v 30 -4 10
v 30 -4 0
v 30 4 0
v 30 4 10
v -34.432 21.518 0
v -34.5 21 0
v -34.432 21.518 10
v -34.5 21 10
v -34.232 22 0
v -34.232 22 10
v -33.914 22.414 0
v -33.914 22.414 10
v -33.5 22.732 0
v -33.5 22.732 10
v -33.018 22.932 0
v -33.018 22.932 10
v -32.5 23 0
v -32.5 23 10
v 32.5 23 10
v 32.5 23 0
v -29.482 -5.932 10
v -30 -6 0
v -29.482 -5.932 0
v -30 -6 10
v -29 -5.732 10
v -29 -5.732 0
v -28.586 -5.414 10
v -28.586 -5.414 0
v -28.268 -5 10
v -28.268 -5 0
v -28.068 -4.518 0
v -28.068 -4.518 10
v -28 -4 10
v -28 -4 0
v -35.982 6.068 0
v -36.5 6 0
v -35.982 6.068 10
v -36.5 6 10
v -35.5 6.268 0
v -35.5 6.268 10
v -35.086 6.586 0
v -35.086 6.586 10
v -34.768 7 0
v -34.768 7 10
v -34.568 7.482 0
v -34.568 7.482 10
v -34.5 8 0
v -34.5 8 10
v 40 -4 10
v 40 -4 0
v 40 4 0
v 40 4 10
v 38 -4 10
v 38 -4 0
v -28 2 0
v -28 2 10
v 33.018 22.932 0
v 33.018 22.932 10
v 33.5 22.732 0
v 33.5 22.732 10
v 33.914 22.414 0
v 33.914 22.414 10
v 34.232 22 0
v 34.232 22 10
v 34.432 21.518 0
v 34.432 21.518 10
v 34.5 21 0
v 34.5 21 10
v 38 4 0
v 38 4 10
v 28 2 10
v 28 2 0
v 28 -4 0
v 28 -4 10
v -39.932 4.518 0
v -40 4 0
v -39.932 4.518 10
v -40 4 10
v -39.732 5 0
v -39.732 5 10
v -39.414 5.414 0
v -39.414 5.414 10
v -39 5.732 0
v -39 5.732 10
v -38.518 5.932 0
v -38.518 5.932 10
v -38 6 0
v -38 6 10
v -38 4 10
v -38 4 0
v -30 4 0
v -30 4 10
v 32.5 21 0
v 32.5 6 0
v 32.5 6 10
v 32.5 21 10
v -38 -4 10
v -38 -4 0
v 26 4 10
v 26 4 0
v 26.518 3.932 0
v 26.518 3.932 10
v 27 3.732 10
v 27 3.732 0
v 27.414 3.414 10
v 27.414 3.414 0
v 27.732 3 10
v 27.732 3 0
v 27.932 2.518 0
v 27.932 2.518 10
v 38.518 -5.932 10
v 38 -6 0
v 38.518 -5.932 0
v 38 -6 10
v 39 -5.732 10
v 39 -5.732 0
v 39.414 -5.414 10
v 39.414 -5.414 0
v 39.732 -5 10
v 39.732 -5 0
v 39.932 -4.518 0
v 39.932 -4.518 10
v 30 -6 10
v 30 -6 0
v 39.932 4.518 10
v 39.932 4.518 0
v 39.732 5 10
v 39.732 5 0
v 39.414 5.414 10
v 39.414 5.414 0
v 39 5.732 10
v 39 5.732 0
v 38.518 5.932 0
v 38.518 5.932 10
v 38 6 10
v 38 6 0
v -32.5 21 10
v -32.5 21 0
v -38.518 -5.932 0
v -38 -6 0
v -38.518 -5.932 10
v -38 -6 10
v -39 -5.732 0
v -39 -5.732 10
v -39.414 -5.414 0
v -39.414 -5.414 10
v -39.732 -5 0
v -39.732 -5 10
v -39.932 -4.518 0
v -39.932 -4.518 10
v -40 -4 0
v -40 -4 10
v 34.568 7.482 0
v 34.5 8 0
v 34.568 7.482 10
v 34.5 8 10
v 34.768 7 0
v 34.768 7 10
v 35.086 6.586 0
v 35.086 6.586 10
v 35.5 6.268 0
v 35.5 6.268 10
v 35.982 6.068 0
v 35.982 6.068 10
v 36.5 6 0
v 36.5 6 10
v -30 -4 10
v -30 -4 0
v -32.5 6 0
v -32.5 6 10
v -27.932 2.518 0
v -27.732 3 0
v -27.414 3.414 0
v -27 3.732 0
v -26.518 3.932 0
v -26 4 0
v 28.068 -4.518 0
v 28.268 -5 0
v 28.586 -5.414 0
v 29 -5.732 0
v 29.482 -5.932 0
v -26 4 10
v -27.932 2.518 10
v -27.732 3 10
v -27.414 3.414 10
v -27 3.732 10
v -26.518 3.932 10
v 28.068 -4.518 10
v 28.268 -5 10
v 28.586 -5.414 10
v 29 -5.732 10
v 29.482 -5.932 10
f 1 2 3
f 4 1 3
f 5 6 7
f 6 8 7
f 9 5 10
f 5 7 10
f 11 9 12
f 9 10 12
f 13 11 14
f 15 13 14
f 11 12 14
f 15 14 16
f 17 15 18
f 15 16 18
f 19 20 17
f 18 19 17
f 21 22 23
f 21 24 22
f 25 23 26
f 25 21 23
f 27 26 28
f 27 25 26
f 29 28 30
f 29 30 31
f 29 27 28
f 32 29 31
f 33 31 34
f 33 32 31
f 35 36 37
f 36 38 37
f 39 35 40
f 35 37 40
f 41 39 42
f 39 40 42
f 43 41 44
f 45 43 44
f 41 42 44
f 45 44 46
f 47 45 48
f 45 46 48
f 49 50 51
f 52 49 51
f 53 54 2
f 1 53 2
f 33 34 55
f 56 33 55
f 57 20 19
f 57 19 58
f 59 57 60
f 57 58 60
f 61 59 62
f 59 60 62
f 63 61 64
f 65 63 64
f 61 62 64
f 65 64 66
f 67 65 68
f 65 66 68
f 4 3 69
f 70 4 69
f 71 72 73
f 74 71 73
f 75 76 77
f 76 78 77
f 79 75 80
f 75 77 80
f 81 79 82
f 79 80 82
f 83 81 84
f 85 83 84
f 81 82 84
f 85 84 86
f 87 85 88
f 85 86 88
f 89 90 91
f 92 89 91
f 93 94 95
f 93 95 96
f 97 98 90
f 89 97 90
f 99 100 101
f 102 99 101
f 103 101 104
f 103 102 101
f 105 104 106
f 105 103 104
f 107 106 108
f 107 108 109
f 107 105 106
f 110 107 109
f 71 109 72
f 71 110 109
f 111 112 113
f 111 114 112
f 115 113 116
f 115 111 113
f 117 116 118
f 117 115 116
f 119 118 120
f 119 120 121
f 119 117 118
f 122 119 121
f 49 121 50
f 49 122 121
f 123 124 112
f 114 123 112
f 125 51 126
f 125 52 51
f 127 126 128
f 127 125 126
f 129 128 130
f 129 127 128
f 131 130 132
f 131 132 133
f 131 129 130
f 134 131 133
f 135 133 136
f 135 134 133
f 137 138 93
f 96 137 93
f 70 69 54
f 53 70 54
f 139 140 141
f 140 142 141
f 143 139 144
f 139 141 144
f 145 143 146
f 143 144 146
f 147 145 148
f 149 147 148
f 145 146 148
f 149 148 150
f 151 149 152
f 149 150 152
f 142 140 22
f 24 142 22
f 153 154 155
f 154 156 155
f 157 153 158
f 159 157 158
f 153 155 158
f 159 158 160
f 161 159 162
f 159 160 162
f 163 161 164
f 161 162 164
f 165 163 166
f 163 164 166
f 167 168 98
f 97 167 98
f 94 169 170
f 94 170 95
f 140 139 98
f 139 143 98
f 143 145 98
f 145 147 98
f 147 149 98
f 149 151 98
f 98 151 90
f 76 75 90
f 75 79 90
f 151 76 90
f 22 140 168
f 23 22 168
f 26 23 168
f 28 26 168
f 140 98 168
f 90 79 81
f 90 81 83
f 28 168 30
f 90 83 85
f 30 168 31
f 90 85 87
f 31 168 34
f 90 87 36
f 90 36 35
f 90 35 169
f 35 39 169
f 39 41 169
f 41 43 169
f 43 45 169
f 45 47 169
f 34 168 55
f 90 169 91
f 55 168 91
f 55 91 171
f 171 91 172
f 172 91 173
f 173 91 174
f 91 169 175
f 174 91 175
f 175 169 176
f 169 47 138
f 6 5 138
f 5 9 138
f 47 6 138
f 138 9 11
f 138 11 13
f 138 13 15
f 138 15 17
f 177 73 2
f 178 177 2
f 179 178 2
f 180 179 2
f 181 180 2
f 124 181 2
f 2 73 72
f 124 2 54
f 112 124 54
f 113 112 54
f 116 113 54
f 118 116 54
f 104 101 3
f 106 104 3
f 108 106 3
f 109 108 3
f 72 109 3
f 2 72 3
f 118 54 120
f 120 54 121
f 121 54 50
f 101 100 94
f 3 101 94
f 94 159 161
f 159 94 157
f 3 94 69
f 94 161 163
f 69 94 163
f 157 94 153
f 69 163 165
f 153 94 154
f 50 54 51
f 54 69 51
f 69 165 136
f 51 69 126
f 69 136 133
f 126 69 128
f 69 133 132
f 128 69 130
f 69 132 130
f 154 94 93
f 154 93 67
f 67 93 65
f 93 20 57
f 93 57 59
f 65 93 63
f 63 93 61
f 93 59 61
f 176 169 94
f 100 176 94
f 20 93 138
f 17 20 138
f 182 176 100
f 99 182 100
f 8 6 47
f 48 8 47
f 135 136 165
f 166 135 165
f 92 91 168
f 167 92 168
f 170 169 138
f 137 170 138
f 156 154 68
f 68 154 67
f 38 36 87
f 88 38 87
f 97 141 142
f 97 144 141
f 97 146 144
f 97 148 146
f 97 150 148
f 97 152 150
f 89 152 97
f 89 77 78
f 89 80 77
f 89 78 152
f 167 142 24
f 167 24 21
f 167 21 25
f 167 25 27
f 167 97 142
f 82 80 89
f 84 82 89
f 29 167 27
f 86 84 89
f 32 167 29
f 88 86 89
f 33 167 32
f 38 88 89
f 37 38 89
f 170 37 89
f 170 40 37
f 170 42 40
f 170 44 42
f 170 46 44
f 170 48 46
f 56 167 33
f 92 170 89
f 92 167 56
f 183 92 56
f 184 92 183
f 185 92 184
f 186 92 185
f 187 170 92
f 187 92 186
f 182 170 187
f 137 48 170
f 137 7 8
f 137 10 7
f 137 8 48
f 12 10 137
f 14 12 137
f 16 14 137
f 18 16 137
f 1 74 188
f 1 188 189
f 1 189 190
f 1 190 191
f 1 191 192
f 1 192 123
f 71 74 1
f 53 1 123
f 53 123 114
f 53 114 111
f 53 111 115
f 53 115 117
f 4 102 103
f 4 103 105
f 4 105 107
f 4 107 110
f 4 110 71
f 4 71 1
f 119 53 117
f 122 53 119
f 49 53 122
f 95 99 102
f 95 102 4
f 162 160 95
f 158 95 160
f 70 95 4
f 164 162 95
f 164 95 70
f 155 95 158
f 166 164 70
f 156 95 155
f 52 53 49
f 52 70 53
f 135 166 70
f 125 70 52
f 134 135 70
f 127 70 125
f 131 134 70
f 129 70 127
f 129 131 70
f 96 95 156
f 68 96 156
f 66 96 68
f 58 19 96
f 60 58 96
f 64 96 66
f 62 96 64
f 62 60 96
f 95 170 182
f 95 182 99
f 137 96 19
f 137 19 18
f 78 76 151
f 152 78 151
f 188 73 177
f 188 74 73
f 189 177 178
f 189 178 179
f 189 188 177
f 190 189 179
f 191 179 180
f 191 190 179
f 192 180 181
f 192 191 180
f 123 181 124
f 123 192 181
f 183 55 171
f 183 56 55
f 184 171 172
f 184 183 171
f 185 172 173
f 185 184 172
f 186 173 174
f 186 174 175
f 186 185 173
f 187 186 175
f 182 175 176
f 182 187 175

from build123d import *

# Parameters (mm, degrees)
F0_W     = 65
F0_H     = 15
F1_DEPTH = 10
F2_R     = 2


with BuildPart() as f1:
    # F0 (on Top) → F1 (new body)
    with BuildSketch(Plane.XY):
        Polygon((-40, -6), (-28, -6), (-28, 4), (28, 4), (28, -6), (40, -6), (40, 6), (34.5, 6), (34.5, 23), (-34.5, 23), (-34.5, 6), (-40, 6), align=None)
        Polygon((-38, 4), (-34.5, 4), (-30, 4), (-30, -4), (-38, -4), align=None, mode=Mode.SUBTRACT)
        Polygon((38, -4), (30, -4), (30, 4), (34.5, 4), (38, 4), align=None, mode=Mode.SUBTRACT)
        with Locations((0, 13.5)):
            Rectangle(F0_W, F0_H, mode=Mode.SUBTRACT)
    extrude(amount=F1_DEPTH)

    # F2
    f2_edges = [f1.edges().sort_by_distance(p)[0] for p in [
        (-34.5, 23, 5),
        (-40, 6, 5),
        (-40, -6, 5),
        (-28, -6, 5),
        (-28, 4, 5),
        (-34.5, 6, 5),
        (34.5, 23, 5),
        (34.5, 6, 5),
        (40, 6, 5),
        (40, -6, 5),
        (28, 4, 5),
        (28, -6, 5),
    ]]
    fillet(f2_edges, radius=F2_R)


solid = f1.part
